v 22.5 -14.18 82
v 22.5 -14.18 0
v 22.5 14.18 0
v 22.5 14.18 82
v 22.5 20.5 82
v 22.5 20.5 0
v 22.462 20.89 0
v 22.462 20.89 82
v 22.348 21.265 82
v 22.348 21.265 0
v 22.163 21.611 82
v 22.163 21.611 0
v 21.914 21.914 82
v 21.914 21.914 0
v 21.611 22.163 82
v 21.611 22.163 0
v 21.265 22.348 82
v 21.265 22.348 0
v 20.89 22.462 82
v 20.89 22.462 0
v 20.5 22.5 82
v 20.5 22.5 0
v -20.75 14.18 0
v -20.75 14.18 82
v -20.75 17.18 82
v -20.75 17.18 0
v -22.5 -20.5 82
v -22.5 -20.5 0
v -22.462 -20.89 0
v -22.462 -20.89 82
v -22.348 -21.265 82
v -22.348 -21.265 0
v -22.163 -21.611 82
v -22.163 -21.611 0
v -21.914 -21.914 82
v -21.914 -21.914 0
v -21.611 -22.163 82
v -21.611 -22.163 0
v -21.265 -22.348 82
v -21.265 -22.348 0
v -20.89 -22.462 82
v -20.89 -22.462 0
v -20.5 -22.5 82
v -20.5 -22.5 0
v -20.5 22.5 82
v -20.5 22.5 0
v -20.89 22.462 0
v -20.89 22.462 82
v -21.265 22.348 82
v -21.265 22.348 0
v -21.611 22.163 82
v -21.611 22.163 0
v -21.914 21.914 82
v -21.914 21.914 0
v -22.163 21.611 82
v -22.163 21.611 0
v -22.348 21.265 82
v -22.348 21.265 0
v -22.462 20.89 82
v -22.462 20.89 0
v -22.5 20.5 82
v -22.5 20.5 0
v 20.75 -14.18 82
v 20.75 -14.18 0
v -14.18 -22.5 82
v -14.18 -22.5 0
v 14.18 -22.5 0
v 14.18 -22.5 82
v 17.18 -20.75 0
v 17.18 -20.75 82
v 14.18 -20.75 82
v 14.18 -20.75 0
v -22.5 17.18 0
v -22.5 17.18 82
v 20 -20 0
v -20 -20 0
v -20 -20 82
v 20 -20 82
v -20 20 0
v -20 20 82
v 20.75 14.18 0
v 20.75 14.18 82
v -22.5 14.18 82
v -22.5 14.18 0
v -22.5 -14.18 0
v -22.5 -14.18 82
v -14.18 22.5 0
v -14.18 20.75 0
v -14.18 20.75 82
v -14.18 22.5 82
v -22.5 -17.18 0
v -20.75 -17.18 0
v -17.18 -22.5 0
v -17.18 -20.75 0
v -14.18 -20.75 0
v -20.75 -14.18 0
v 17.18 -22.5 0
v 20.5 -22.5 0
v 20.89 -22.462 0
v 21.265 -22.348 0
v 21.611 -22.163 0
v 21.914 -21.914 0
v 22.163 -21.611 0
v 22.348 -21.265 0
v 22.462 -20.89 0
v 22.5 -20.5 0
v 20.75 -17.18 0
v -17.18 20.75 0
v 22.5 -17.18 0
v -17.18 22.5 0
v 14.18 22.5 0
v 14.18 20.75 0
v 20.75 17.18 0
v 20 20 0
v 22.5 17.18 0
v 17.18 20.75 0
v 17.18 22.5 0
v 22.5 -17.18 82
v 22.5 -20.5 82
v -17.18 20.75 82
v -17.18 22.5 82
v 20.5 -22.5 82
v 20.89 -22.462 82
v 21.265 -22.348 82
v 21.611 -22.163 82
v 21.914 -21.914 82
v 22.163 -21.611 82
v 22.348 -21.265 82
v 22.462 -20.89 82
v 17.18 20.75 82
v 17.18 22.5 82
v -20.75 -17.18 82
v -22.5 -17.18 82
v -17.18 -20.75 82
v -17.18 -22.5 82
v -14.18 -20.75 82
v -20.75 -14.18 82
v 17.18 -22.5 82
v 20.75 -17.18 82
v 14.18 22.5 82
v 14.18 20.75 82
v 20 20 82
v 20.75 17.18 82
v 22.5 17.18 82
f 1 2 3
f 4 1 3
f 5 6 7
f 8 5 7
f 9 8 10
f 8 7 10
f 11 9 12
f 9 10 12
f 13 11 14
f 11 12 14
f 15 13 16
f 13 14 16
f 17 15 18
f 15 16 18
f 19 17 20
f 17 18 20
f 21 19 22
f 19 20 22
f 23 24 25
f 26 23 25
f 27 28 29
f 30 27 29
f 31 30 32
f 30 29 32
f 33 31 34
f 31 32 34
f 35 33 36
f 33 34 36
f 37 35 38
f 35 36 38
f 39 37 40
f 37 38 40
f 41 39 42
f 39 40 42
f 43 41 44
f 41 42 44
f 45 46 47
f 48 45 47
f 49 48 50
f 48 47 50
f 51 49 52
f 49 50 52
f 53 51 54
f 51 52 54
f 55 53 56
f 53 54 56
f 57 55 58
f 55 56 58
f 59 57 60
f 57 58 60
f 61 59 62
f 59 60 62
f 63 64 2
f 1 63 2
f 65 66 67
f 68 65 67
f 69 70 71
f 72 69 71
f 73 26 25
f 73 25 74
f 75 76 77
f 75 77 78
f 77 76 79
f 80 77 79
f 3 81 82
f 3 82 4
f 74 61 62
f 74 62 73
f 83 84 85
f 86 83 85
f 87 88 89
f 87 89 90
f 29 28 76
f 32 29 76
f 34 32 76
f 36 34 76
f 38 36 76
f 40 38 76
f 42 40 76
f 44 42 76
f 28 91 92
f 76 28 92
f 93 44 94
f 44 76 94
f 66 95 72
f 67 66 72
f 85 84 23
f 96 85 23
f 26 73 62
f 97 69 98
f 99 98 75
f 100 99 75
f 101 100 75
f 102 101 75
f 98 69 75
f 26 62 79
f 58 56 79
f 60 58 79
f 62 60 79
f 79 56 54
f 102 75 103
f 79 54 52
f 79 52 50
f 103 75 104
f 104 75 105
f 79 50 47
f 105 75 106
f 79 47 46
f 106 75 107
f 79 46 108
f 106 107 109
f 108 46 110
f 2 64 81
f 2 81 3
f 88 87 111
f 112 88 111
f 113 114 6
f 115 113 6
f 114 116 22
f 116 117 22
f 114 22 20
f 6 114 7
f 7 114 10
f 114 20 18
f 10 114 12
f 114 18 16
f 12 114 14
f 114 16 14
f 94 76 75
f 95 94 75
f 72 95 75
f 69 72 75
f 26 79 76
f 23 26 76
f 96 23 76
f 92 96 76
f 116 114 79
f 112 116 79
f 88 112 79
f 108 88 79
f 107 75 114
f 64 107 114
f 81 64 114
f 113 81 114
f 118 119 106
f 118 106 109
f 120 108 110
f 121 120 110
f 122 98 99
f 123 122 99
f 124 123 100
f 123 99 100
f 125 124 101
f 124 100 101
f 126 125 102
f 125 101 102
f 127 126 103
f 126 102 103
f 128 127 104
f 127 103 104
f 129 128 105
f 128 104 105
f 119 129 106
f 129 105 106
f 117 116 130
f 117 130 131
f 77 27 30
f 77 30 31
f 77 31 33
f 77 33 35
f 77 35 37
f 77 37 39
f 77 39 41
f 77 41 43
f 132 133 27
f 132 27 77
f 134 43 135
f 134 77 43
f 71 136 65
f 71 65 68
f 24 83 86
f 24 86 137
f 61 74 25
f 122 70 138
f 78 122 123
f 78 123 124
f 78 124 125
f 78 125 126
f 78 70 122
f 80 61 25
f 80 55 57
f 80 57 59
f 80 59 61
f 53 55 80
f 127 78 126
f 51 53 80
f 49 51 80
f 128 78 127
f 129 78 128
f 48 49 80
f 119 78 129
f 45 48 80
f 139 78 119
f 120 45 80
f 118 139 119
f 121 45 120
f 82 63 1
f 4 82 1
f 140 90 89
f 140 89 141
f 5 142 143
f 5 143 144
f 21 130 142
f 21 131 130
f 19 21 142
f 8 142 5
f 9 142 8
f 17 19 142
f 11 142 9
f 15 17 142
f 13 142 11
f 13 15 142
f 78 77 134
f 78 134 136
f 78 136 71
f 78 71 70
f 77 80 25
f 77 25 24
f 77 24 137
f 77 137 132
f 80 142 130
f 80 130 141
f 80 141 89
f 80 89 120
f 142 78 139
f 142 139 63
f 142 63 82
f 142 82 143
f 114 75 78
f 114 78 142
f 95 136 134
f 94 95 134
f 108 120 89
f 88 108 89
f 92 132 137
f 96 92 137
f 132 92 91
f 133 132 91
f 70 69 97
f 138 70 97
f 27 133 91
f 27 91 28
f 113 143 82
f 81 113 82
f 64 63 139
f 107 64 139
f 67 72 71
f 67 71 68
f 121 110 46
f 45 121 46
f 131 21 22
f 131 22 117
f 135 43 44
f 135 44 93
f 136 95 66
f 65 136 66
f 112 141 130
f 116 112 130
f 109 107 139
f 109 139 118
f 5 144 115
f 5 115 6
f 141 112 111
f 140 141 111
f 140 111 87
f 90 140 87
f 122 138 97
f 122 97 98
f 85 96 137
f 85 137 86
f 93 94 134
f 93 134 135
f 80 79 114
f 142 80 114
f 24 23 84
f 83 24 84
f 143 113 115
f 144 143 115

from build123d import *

# Parameters (mm, degrees)
F0_W            = 40
F0_H            = 40
F1_DEPTH        = 82
F2_W            = 3
F2_H            = 1.75
F3_DEPTH        = 82
F3_COPIES_COUNT = 4


# Not quite as in the source:
# - a pattern or mirror of a feature is missing from the dataset's text; its kind, count and spacing are read off the source's solid


with BuildPart() as f1:
    # F0 (on Top) → F1 (new body)
    with BuildSketch(Plane.XY):
        with BuildLine():
            Line((-20.5, -22.5), (20.5, -22.5))
            ThreePointArc((20.5, -22.5), (21.9142135624, -21.9142135624), (22.5, -20.5))
            Line((22.5, -20.5), (22.5, 20.5))
            ThreePointArc((22.5, 20.5), (21.9142135624, 21.9142135624), (20.5, 22.5))
            Line((20.5, 22.5), (-20.5, 22.5))
            ThreePointArc((-20.5, 22.5), (-21.9142135624, 21.9142135624), (-22.5, 20.5))
            Line((-22.5, 20.5), (-22.5, -20.5))
            ThreePointArc((-22.5, -20.5), (-21.9142135624, -21.9142135624), (-20.5, -22.5))
        make_face()
        Rectangle(F0_W, F0_H, mode=Mode.SUBTRACT)
    extrude(amount=F1_DEPTH)

    # F2 (on face) → F3 (cut, through all)
    with BuildSketch(Plane.XY.offset(82)):
        with Locations((-15.68, 21.625)):
            Rectangle(F2_W, F2_H)
        with Locations((15.68, 21.625)):
            Rectangle(F2_W, F2_H)
    f3 = extrude(amount=-F3_DEPTH, mode=Mode.SUBTRACT)

    # F3_copies: F3 ×4 about axis
    f3_copies_axis = Axis((0, 0, 0), (0, 0, 1))
    for i in range(1, F3_COPIES_COUNT):
        add(f3.rotate(f3_copies_axis, i * 360 / F3_COPIES_COUNT), mode=Mode.SUBTRACT)


solid = f1.part
